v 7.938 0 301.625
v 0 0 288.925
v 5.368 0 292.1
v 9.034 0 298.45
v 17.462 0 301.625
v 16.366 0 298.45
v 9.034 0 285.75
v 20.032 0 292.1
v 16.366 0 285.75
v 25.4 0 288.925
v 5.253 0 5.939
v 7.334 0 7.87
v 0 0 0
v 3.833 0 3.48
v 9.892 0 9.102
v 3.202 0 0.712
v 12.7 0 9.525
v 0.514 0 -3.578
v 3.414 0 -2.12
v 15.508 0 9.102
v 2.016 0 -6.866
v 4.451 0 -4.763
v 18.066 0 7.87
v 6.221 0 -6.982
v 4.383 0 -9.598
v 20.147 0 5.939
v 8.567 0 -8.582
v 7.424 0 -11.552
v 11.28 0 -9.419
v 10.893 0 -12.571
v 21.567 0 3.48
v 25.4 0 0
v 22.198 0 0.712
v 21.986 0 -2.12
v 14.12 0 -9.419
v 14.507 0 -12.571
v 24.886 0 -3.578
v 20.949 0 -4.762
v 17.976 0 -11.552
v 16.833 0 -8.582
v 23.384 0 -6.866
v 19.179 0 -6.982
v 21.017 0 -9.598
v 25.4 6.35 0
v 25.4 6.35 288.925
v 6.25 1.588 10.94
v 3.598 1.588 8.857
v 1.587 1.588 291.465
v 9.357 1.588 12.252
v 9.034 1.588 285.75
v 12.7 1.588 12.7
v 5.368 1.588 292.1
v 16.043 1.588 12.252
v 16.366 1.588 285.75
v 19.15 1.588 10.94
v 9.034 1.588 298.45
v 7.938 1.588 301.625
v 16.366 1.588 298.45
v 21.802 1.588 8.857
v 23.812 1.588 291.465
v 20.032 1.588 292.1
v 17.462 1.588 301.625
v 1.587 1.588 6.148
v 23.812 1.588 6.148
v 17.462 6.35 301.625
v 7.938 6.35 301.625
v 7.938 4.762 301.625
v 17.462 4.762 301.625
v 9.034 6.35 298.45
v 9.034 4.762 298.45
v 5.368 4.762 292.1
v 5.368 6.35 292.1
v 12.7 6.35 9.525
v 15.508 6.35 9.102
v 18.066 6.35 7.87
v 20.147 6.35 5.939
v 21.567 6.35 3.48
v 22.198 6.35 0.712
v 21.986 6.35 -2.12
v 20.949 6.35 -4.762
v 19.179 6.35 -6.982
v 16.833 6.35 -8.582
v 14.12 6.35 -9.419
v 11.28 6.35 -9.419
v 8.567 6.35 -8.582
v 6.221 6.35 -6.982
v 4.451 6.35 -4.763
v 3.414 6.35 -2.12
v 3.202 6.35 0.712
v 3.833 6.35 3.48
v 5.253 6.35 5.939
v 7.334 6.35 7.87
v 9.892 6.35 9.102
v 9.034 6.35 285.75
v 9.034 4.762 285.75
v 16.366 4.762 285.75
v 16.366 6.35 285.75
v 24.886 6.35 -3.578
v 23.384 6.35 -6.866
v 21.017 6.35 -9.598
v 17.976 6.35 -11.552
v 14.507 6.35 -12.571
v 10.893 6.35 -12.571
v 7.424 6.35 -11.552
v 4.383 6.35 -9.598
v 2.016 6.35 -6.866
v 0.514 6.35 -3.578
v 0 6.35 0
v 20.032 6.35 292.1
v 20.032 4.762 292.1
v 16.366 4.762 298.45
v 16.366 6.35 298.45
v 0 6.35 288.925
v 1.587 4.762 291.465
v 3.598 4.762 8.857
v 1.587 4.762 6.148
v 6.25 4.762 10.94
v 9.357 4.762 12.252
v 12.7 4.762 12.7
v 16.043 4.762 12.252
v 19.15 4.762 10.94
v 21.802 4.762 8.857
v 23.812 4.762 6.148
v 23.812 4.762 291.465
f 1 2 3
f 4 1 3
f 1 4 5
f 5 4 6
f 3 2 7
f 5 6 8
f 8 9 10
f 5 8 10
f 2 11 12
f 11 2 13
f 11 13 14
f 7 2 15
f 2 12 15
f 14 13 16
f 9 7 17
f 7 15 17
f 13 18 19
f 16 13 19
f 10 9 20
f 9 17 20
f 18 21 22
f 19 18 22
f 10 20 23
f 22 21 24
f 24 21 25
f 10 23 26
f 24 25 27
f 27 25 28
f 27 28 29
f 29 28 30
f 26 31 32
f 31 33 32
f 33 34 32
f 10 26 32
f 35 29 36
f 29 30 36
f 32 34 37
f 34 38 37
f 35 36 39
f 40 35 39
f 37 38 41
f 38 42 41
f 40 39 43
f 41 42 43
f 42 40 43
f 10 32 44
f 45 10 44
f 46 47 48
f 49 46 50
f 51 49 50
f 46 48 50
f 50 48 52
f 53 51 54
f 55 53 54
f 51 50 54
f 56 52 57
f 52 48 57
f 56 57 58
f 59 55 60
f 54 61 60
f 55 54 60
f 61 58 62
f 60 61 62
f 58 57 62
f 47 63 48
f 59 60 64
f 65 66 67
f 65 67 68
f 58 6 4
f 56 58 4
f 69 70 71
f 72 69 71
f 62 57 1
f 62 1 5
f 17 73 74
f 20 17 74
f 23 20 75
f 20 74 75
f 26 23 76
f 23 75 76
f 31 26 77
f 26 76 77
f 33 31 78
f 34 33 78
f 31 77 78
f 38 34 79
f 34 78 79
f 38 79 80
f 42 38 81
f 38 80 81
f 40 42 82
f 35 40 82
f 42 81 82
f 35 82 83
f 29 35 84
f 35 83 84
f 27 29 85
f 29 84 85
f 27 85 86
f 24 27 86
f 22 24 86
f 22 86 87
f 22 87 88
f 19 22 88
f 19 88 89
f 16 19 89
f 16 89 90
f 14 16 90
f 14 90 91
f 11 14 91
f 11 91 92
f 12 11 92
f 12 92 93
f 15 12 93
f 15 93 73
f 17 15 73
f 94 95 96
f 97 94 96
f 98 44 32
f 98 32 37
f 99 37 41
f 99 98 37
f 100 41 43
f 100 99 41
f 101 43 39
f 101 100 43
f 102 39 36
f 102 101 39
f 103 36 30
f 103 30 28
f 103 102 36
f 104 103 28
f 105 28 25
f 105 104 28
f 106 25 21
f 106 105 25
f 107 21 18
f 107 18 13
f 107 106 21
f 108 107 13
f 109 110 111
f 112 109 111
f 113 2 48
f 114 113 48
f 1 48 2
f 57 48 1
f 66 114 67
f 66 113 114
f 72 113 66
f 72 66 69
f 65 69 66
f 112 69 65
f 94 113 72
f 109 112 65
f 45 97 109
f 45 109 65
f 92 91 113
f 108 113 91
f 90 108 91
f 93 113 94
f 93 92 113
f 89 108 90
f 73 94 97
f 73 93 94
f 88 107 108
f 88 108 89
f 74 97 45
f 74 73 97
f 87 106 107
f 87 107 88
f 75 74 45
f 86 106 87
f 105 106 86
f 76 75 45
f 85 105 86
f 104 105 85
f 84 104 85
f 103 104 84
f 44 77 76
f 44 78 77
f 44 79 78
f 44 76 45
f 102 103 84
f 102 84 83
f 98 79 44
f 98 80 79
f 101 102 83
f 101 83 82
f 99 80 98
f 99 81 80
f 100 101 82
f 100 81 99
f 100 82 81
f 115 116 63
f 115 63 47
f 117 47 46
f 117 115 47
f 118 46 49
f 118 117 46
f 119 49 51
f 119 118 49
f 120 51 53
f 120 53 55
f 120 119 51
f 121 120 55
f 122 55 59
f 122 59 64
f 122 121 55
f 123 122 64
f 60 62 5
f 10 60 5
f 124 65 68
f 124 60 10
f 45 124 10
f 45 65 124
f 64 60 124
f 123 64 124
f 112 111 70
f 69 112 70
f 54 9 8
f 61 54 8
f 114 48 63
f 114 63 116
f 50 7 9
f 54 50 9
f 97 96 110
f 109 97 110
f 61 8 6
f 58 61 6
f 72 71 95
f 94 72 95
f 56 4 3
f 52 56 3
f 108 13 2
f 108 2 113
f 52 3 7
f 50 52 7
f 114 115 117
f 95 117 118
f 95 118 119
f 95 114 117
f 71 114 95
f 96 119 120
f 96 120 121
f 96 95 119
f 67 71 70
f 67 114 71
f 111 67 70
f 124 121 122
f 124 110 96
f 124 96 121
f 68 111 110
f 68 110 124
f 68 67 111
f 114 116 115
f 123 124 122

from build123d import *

# Parameters (mm, degrees)
SKETCH1_W           = 25.4
SKETCH1_H           = 6.35
BOSS_EXTRUDE1_DEPTH = 304.8
SKETCH2_W           = 22.225
SKETCH2_H           = 3.175
CUT_EXTRUDE1_DEPTH  = 306.922412549
CUT_EXTRUDE2_DEPTH  = 306.922412549
CUT_EXTRUDE3_DEPTH  = 306.922412549
SKETCH5_R           = 12.7
BOSS_EXTRUDE2_DEPTH = 6.35
SKETCH6_R           = 9.525
CUT_EXTRUDE4_DEPTH  = 303.759183387


with BuildPart() as part:
    # Sketch1 → Boss-Extrude1 (new body)
    with BuildSketch(Plane.XY):
        with Locations((12.7, 3.175)):
            Rectangle(SKETCH1_W, SKETCH1_H)
    extrude(amount=BOSS_EXTRUDE1_DEPTH)

    # Sketch2 → Cut-Extrude1 (cut, through all)
    with BuildSketch(Plane.XY.offset(304.8)):
        with Locations((12.7, 3.175)):
            Rectangle(SKETCH2_W, SKETCH2_H)
    extrude(amount=-CUT_EXTRUDE1_DEPTH, mode=Mode.SUBTRACT)

    # Sketch3 → Cut-Extrude2 (cut, through all)
    with BuildSketch(Plane.XZ):
        Polygon((20.032348419, 292.1), (16.366174209, 298.45), (9.033825791, 298.45), (5.367651581, 292.1), (9.033825791, 285.75), (16.366174209, 285.75), align=None)
    extrude(amount=-CUT_EXTRUDE2_DEPTH, mode=Mode.SUBTRACT)

    # Sketch4 → Cut-Extrude3 (cut, through all)
    with BuildSketch(Plane(origin=(0, 6.35, 0), x_dir=(1, 0, 0), z_dir=(0, 1, 0))):
        Polygon((0, -288.925), (7.9375, -301.625), (17.4625, -301.625), (25.4, -288.925), (25.4, -304.8), (0, -304.8), align=None)
    extrude(amount=-CUT_EXTRUDE3_DEPTH, mode=Mode.SUBTRACT)

    # Sketch5 → Boss-Extrude2 (add)
    with BuildSketch(Plane(origin=(0, 6.35, 0), x_dir=(1, 0, 0), z_dir=(0, 1, 0))):
        with Locations((12.7, 0)):
            Circle(SKETCH5_R)
    extrude(amount=-BOSS_EXTRUDE2_DEPTH)

    # Sketch6 → Cut-Extrude4 (cut, through all)
    with BuildSketch(Plane(origin=(0, 6.35, 0), x_dir=(1, 0, 0), z_dir=(0, 1, 0))):
        with Locations(Location((12.7, 0, 0), (0, 0, 270))):
            Circle(SKETCH6_R)
    extrude(amount=-CUT_EXTRUDE4_DEPTH, mode=Mode.SUBTRACT)


solid = part.part
